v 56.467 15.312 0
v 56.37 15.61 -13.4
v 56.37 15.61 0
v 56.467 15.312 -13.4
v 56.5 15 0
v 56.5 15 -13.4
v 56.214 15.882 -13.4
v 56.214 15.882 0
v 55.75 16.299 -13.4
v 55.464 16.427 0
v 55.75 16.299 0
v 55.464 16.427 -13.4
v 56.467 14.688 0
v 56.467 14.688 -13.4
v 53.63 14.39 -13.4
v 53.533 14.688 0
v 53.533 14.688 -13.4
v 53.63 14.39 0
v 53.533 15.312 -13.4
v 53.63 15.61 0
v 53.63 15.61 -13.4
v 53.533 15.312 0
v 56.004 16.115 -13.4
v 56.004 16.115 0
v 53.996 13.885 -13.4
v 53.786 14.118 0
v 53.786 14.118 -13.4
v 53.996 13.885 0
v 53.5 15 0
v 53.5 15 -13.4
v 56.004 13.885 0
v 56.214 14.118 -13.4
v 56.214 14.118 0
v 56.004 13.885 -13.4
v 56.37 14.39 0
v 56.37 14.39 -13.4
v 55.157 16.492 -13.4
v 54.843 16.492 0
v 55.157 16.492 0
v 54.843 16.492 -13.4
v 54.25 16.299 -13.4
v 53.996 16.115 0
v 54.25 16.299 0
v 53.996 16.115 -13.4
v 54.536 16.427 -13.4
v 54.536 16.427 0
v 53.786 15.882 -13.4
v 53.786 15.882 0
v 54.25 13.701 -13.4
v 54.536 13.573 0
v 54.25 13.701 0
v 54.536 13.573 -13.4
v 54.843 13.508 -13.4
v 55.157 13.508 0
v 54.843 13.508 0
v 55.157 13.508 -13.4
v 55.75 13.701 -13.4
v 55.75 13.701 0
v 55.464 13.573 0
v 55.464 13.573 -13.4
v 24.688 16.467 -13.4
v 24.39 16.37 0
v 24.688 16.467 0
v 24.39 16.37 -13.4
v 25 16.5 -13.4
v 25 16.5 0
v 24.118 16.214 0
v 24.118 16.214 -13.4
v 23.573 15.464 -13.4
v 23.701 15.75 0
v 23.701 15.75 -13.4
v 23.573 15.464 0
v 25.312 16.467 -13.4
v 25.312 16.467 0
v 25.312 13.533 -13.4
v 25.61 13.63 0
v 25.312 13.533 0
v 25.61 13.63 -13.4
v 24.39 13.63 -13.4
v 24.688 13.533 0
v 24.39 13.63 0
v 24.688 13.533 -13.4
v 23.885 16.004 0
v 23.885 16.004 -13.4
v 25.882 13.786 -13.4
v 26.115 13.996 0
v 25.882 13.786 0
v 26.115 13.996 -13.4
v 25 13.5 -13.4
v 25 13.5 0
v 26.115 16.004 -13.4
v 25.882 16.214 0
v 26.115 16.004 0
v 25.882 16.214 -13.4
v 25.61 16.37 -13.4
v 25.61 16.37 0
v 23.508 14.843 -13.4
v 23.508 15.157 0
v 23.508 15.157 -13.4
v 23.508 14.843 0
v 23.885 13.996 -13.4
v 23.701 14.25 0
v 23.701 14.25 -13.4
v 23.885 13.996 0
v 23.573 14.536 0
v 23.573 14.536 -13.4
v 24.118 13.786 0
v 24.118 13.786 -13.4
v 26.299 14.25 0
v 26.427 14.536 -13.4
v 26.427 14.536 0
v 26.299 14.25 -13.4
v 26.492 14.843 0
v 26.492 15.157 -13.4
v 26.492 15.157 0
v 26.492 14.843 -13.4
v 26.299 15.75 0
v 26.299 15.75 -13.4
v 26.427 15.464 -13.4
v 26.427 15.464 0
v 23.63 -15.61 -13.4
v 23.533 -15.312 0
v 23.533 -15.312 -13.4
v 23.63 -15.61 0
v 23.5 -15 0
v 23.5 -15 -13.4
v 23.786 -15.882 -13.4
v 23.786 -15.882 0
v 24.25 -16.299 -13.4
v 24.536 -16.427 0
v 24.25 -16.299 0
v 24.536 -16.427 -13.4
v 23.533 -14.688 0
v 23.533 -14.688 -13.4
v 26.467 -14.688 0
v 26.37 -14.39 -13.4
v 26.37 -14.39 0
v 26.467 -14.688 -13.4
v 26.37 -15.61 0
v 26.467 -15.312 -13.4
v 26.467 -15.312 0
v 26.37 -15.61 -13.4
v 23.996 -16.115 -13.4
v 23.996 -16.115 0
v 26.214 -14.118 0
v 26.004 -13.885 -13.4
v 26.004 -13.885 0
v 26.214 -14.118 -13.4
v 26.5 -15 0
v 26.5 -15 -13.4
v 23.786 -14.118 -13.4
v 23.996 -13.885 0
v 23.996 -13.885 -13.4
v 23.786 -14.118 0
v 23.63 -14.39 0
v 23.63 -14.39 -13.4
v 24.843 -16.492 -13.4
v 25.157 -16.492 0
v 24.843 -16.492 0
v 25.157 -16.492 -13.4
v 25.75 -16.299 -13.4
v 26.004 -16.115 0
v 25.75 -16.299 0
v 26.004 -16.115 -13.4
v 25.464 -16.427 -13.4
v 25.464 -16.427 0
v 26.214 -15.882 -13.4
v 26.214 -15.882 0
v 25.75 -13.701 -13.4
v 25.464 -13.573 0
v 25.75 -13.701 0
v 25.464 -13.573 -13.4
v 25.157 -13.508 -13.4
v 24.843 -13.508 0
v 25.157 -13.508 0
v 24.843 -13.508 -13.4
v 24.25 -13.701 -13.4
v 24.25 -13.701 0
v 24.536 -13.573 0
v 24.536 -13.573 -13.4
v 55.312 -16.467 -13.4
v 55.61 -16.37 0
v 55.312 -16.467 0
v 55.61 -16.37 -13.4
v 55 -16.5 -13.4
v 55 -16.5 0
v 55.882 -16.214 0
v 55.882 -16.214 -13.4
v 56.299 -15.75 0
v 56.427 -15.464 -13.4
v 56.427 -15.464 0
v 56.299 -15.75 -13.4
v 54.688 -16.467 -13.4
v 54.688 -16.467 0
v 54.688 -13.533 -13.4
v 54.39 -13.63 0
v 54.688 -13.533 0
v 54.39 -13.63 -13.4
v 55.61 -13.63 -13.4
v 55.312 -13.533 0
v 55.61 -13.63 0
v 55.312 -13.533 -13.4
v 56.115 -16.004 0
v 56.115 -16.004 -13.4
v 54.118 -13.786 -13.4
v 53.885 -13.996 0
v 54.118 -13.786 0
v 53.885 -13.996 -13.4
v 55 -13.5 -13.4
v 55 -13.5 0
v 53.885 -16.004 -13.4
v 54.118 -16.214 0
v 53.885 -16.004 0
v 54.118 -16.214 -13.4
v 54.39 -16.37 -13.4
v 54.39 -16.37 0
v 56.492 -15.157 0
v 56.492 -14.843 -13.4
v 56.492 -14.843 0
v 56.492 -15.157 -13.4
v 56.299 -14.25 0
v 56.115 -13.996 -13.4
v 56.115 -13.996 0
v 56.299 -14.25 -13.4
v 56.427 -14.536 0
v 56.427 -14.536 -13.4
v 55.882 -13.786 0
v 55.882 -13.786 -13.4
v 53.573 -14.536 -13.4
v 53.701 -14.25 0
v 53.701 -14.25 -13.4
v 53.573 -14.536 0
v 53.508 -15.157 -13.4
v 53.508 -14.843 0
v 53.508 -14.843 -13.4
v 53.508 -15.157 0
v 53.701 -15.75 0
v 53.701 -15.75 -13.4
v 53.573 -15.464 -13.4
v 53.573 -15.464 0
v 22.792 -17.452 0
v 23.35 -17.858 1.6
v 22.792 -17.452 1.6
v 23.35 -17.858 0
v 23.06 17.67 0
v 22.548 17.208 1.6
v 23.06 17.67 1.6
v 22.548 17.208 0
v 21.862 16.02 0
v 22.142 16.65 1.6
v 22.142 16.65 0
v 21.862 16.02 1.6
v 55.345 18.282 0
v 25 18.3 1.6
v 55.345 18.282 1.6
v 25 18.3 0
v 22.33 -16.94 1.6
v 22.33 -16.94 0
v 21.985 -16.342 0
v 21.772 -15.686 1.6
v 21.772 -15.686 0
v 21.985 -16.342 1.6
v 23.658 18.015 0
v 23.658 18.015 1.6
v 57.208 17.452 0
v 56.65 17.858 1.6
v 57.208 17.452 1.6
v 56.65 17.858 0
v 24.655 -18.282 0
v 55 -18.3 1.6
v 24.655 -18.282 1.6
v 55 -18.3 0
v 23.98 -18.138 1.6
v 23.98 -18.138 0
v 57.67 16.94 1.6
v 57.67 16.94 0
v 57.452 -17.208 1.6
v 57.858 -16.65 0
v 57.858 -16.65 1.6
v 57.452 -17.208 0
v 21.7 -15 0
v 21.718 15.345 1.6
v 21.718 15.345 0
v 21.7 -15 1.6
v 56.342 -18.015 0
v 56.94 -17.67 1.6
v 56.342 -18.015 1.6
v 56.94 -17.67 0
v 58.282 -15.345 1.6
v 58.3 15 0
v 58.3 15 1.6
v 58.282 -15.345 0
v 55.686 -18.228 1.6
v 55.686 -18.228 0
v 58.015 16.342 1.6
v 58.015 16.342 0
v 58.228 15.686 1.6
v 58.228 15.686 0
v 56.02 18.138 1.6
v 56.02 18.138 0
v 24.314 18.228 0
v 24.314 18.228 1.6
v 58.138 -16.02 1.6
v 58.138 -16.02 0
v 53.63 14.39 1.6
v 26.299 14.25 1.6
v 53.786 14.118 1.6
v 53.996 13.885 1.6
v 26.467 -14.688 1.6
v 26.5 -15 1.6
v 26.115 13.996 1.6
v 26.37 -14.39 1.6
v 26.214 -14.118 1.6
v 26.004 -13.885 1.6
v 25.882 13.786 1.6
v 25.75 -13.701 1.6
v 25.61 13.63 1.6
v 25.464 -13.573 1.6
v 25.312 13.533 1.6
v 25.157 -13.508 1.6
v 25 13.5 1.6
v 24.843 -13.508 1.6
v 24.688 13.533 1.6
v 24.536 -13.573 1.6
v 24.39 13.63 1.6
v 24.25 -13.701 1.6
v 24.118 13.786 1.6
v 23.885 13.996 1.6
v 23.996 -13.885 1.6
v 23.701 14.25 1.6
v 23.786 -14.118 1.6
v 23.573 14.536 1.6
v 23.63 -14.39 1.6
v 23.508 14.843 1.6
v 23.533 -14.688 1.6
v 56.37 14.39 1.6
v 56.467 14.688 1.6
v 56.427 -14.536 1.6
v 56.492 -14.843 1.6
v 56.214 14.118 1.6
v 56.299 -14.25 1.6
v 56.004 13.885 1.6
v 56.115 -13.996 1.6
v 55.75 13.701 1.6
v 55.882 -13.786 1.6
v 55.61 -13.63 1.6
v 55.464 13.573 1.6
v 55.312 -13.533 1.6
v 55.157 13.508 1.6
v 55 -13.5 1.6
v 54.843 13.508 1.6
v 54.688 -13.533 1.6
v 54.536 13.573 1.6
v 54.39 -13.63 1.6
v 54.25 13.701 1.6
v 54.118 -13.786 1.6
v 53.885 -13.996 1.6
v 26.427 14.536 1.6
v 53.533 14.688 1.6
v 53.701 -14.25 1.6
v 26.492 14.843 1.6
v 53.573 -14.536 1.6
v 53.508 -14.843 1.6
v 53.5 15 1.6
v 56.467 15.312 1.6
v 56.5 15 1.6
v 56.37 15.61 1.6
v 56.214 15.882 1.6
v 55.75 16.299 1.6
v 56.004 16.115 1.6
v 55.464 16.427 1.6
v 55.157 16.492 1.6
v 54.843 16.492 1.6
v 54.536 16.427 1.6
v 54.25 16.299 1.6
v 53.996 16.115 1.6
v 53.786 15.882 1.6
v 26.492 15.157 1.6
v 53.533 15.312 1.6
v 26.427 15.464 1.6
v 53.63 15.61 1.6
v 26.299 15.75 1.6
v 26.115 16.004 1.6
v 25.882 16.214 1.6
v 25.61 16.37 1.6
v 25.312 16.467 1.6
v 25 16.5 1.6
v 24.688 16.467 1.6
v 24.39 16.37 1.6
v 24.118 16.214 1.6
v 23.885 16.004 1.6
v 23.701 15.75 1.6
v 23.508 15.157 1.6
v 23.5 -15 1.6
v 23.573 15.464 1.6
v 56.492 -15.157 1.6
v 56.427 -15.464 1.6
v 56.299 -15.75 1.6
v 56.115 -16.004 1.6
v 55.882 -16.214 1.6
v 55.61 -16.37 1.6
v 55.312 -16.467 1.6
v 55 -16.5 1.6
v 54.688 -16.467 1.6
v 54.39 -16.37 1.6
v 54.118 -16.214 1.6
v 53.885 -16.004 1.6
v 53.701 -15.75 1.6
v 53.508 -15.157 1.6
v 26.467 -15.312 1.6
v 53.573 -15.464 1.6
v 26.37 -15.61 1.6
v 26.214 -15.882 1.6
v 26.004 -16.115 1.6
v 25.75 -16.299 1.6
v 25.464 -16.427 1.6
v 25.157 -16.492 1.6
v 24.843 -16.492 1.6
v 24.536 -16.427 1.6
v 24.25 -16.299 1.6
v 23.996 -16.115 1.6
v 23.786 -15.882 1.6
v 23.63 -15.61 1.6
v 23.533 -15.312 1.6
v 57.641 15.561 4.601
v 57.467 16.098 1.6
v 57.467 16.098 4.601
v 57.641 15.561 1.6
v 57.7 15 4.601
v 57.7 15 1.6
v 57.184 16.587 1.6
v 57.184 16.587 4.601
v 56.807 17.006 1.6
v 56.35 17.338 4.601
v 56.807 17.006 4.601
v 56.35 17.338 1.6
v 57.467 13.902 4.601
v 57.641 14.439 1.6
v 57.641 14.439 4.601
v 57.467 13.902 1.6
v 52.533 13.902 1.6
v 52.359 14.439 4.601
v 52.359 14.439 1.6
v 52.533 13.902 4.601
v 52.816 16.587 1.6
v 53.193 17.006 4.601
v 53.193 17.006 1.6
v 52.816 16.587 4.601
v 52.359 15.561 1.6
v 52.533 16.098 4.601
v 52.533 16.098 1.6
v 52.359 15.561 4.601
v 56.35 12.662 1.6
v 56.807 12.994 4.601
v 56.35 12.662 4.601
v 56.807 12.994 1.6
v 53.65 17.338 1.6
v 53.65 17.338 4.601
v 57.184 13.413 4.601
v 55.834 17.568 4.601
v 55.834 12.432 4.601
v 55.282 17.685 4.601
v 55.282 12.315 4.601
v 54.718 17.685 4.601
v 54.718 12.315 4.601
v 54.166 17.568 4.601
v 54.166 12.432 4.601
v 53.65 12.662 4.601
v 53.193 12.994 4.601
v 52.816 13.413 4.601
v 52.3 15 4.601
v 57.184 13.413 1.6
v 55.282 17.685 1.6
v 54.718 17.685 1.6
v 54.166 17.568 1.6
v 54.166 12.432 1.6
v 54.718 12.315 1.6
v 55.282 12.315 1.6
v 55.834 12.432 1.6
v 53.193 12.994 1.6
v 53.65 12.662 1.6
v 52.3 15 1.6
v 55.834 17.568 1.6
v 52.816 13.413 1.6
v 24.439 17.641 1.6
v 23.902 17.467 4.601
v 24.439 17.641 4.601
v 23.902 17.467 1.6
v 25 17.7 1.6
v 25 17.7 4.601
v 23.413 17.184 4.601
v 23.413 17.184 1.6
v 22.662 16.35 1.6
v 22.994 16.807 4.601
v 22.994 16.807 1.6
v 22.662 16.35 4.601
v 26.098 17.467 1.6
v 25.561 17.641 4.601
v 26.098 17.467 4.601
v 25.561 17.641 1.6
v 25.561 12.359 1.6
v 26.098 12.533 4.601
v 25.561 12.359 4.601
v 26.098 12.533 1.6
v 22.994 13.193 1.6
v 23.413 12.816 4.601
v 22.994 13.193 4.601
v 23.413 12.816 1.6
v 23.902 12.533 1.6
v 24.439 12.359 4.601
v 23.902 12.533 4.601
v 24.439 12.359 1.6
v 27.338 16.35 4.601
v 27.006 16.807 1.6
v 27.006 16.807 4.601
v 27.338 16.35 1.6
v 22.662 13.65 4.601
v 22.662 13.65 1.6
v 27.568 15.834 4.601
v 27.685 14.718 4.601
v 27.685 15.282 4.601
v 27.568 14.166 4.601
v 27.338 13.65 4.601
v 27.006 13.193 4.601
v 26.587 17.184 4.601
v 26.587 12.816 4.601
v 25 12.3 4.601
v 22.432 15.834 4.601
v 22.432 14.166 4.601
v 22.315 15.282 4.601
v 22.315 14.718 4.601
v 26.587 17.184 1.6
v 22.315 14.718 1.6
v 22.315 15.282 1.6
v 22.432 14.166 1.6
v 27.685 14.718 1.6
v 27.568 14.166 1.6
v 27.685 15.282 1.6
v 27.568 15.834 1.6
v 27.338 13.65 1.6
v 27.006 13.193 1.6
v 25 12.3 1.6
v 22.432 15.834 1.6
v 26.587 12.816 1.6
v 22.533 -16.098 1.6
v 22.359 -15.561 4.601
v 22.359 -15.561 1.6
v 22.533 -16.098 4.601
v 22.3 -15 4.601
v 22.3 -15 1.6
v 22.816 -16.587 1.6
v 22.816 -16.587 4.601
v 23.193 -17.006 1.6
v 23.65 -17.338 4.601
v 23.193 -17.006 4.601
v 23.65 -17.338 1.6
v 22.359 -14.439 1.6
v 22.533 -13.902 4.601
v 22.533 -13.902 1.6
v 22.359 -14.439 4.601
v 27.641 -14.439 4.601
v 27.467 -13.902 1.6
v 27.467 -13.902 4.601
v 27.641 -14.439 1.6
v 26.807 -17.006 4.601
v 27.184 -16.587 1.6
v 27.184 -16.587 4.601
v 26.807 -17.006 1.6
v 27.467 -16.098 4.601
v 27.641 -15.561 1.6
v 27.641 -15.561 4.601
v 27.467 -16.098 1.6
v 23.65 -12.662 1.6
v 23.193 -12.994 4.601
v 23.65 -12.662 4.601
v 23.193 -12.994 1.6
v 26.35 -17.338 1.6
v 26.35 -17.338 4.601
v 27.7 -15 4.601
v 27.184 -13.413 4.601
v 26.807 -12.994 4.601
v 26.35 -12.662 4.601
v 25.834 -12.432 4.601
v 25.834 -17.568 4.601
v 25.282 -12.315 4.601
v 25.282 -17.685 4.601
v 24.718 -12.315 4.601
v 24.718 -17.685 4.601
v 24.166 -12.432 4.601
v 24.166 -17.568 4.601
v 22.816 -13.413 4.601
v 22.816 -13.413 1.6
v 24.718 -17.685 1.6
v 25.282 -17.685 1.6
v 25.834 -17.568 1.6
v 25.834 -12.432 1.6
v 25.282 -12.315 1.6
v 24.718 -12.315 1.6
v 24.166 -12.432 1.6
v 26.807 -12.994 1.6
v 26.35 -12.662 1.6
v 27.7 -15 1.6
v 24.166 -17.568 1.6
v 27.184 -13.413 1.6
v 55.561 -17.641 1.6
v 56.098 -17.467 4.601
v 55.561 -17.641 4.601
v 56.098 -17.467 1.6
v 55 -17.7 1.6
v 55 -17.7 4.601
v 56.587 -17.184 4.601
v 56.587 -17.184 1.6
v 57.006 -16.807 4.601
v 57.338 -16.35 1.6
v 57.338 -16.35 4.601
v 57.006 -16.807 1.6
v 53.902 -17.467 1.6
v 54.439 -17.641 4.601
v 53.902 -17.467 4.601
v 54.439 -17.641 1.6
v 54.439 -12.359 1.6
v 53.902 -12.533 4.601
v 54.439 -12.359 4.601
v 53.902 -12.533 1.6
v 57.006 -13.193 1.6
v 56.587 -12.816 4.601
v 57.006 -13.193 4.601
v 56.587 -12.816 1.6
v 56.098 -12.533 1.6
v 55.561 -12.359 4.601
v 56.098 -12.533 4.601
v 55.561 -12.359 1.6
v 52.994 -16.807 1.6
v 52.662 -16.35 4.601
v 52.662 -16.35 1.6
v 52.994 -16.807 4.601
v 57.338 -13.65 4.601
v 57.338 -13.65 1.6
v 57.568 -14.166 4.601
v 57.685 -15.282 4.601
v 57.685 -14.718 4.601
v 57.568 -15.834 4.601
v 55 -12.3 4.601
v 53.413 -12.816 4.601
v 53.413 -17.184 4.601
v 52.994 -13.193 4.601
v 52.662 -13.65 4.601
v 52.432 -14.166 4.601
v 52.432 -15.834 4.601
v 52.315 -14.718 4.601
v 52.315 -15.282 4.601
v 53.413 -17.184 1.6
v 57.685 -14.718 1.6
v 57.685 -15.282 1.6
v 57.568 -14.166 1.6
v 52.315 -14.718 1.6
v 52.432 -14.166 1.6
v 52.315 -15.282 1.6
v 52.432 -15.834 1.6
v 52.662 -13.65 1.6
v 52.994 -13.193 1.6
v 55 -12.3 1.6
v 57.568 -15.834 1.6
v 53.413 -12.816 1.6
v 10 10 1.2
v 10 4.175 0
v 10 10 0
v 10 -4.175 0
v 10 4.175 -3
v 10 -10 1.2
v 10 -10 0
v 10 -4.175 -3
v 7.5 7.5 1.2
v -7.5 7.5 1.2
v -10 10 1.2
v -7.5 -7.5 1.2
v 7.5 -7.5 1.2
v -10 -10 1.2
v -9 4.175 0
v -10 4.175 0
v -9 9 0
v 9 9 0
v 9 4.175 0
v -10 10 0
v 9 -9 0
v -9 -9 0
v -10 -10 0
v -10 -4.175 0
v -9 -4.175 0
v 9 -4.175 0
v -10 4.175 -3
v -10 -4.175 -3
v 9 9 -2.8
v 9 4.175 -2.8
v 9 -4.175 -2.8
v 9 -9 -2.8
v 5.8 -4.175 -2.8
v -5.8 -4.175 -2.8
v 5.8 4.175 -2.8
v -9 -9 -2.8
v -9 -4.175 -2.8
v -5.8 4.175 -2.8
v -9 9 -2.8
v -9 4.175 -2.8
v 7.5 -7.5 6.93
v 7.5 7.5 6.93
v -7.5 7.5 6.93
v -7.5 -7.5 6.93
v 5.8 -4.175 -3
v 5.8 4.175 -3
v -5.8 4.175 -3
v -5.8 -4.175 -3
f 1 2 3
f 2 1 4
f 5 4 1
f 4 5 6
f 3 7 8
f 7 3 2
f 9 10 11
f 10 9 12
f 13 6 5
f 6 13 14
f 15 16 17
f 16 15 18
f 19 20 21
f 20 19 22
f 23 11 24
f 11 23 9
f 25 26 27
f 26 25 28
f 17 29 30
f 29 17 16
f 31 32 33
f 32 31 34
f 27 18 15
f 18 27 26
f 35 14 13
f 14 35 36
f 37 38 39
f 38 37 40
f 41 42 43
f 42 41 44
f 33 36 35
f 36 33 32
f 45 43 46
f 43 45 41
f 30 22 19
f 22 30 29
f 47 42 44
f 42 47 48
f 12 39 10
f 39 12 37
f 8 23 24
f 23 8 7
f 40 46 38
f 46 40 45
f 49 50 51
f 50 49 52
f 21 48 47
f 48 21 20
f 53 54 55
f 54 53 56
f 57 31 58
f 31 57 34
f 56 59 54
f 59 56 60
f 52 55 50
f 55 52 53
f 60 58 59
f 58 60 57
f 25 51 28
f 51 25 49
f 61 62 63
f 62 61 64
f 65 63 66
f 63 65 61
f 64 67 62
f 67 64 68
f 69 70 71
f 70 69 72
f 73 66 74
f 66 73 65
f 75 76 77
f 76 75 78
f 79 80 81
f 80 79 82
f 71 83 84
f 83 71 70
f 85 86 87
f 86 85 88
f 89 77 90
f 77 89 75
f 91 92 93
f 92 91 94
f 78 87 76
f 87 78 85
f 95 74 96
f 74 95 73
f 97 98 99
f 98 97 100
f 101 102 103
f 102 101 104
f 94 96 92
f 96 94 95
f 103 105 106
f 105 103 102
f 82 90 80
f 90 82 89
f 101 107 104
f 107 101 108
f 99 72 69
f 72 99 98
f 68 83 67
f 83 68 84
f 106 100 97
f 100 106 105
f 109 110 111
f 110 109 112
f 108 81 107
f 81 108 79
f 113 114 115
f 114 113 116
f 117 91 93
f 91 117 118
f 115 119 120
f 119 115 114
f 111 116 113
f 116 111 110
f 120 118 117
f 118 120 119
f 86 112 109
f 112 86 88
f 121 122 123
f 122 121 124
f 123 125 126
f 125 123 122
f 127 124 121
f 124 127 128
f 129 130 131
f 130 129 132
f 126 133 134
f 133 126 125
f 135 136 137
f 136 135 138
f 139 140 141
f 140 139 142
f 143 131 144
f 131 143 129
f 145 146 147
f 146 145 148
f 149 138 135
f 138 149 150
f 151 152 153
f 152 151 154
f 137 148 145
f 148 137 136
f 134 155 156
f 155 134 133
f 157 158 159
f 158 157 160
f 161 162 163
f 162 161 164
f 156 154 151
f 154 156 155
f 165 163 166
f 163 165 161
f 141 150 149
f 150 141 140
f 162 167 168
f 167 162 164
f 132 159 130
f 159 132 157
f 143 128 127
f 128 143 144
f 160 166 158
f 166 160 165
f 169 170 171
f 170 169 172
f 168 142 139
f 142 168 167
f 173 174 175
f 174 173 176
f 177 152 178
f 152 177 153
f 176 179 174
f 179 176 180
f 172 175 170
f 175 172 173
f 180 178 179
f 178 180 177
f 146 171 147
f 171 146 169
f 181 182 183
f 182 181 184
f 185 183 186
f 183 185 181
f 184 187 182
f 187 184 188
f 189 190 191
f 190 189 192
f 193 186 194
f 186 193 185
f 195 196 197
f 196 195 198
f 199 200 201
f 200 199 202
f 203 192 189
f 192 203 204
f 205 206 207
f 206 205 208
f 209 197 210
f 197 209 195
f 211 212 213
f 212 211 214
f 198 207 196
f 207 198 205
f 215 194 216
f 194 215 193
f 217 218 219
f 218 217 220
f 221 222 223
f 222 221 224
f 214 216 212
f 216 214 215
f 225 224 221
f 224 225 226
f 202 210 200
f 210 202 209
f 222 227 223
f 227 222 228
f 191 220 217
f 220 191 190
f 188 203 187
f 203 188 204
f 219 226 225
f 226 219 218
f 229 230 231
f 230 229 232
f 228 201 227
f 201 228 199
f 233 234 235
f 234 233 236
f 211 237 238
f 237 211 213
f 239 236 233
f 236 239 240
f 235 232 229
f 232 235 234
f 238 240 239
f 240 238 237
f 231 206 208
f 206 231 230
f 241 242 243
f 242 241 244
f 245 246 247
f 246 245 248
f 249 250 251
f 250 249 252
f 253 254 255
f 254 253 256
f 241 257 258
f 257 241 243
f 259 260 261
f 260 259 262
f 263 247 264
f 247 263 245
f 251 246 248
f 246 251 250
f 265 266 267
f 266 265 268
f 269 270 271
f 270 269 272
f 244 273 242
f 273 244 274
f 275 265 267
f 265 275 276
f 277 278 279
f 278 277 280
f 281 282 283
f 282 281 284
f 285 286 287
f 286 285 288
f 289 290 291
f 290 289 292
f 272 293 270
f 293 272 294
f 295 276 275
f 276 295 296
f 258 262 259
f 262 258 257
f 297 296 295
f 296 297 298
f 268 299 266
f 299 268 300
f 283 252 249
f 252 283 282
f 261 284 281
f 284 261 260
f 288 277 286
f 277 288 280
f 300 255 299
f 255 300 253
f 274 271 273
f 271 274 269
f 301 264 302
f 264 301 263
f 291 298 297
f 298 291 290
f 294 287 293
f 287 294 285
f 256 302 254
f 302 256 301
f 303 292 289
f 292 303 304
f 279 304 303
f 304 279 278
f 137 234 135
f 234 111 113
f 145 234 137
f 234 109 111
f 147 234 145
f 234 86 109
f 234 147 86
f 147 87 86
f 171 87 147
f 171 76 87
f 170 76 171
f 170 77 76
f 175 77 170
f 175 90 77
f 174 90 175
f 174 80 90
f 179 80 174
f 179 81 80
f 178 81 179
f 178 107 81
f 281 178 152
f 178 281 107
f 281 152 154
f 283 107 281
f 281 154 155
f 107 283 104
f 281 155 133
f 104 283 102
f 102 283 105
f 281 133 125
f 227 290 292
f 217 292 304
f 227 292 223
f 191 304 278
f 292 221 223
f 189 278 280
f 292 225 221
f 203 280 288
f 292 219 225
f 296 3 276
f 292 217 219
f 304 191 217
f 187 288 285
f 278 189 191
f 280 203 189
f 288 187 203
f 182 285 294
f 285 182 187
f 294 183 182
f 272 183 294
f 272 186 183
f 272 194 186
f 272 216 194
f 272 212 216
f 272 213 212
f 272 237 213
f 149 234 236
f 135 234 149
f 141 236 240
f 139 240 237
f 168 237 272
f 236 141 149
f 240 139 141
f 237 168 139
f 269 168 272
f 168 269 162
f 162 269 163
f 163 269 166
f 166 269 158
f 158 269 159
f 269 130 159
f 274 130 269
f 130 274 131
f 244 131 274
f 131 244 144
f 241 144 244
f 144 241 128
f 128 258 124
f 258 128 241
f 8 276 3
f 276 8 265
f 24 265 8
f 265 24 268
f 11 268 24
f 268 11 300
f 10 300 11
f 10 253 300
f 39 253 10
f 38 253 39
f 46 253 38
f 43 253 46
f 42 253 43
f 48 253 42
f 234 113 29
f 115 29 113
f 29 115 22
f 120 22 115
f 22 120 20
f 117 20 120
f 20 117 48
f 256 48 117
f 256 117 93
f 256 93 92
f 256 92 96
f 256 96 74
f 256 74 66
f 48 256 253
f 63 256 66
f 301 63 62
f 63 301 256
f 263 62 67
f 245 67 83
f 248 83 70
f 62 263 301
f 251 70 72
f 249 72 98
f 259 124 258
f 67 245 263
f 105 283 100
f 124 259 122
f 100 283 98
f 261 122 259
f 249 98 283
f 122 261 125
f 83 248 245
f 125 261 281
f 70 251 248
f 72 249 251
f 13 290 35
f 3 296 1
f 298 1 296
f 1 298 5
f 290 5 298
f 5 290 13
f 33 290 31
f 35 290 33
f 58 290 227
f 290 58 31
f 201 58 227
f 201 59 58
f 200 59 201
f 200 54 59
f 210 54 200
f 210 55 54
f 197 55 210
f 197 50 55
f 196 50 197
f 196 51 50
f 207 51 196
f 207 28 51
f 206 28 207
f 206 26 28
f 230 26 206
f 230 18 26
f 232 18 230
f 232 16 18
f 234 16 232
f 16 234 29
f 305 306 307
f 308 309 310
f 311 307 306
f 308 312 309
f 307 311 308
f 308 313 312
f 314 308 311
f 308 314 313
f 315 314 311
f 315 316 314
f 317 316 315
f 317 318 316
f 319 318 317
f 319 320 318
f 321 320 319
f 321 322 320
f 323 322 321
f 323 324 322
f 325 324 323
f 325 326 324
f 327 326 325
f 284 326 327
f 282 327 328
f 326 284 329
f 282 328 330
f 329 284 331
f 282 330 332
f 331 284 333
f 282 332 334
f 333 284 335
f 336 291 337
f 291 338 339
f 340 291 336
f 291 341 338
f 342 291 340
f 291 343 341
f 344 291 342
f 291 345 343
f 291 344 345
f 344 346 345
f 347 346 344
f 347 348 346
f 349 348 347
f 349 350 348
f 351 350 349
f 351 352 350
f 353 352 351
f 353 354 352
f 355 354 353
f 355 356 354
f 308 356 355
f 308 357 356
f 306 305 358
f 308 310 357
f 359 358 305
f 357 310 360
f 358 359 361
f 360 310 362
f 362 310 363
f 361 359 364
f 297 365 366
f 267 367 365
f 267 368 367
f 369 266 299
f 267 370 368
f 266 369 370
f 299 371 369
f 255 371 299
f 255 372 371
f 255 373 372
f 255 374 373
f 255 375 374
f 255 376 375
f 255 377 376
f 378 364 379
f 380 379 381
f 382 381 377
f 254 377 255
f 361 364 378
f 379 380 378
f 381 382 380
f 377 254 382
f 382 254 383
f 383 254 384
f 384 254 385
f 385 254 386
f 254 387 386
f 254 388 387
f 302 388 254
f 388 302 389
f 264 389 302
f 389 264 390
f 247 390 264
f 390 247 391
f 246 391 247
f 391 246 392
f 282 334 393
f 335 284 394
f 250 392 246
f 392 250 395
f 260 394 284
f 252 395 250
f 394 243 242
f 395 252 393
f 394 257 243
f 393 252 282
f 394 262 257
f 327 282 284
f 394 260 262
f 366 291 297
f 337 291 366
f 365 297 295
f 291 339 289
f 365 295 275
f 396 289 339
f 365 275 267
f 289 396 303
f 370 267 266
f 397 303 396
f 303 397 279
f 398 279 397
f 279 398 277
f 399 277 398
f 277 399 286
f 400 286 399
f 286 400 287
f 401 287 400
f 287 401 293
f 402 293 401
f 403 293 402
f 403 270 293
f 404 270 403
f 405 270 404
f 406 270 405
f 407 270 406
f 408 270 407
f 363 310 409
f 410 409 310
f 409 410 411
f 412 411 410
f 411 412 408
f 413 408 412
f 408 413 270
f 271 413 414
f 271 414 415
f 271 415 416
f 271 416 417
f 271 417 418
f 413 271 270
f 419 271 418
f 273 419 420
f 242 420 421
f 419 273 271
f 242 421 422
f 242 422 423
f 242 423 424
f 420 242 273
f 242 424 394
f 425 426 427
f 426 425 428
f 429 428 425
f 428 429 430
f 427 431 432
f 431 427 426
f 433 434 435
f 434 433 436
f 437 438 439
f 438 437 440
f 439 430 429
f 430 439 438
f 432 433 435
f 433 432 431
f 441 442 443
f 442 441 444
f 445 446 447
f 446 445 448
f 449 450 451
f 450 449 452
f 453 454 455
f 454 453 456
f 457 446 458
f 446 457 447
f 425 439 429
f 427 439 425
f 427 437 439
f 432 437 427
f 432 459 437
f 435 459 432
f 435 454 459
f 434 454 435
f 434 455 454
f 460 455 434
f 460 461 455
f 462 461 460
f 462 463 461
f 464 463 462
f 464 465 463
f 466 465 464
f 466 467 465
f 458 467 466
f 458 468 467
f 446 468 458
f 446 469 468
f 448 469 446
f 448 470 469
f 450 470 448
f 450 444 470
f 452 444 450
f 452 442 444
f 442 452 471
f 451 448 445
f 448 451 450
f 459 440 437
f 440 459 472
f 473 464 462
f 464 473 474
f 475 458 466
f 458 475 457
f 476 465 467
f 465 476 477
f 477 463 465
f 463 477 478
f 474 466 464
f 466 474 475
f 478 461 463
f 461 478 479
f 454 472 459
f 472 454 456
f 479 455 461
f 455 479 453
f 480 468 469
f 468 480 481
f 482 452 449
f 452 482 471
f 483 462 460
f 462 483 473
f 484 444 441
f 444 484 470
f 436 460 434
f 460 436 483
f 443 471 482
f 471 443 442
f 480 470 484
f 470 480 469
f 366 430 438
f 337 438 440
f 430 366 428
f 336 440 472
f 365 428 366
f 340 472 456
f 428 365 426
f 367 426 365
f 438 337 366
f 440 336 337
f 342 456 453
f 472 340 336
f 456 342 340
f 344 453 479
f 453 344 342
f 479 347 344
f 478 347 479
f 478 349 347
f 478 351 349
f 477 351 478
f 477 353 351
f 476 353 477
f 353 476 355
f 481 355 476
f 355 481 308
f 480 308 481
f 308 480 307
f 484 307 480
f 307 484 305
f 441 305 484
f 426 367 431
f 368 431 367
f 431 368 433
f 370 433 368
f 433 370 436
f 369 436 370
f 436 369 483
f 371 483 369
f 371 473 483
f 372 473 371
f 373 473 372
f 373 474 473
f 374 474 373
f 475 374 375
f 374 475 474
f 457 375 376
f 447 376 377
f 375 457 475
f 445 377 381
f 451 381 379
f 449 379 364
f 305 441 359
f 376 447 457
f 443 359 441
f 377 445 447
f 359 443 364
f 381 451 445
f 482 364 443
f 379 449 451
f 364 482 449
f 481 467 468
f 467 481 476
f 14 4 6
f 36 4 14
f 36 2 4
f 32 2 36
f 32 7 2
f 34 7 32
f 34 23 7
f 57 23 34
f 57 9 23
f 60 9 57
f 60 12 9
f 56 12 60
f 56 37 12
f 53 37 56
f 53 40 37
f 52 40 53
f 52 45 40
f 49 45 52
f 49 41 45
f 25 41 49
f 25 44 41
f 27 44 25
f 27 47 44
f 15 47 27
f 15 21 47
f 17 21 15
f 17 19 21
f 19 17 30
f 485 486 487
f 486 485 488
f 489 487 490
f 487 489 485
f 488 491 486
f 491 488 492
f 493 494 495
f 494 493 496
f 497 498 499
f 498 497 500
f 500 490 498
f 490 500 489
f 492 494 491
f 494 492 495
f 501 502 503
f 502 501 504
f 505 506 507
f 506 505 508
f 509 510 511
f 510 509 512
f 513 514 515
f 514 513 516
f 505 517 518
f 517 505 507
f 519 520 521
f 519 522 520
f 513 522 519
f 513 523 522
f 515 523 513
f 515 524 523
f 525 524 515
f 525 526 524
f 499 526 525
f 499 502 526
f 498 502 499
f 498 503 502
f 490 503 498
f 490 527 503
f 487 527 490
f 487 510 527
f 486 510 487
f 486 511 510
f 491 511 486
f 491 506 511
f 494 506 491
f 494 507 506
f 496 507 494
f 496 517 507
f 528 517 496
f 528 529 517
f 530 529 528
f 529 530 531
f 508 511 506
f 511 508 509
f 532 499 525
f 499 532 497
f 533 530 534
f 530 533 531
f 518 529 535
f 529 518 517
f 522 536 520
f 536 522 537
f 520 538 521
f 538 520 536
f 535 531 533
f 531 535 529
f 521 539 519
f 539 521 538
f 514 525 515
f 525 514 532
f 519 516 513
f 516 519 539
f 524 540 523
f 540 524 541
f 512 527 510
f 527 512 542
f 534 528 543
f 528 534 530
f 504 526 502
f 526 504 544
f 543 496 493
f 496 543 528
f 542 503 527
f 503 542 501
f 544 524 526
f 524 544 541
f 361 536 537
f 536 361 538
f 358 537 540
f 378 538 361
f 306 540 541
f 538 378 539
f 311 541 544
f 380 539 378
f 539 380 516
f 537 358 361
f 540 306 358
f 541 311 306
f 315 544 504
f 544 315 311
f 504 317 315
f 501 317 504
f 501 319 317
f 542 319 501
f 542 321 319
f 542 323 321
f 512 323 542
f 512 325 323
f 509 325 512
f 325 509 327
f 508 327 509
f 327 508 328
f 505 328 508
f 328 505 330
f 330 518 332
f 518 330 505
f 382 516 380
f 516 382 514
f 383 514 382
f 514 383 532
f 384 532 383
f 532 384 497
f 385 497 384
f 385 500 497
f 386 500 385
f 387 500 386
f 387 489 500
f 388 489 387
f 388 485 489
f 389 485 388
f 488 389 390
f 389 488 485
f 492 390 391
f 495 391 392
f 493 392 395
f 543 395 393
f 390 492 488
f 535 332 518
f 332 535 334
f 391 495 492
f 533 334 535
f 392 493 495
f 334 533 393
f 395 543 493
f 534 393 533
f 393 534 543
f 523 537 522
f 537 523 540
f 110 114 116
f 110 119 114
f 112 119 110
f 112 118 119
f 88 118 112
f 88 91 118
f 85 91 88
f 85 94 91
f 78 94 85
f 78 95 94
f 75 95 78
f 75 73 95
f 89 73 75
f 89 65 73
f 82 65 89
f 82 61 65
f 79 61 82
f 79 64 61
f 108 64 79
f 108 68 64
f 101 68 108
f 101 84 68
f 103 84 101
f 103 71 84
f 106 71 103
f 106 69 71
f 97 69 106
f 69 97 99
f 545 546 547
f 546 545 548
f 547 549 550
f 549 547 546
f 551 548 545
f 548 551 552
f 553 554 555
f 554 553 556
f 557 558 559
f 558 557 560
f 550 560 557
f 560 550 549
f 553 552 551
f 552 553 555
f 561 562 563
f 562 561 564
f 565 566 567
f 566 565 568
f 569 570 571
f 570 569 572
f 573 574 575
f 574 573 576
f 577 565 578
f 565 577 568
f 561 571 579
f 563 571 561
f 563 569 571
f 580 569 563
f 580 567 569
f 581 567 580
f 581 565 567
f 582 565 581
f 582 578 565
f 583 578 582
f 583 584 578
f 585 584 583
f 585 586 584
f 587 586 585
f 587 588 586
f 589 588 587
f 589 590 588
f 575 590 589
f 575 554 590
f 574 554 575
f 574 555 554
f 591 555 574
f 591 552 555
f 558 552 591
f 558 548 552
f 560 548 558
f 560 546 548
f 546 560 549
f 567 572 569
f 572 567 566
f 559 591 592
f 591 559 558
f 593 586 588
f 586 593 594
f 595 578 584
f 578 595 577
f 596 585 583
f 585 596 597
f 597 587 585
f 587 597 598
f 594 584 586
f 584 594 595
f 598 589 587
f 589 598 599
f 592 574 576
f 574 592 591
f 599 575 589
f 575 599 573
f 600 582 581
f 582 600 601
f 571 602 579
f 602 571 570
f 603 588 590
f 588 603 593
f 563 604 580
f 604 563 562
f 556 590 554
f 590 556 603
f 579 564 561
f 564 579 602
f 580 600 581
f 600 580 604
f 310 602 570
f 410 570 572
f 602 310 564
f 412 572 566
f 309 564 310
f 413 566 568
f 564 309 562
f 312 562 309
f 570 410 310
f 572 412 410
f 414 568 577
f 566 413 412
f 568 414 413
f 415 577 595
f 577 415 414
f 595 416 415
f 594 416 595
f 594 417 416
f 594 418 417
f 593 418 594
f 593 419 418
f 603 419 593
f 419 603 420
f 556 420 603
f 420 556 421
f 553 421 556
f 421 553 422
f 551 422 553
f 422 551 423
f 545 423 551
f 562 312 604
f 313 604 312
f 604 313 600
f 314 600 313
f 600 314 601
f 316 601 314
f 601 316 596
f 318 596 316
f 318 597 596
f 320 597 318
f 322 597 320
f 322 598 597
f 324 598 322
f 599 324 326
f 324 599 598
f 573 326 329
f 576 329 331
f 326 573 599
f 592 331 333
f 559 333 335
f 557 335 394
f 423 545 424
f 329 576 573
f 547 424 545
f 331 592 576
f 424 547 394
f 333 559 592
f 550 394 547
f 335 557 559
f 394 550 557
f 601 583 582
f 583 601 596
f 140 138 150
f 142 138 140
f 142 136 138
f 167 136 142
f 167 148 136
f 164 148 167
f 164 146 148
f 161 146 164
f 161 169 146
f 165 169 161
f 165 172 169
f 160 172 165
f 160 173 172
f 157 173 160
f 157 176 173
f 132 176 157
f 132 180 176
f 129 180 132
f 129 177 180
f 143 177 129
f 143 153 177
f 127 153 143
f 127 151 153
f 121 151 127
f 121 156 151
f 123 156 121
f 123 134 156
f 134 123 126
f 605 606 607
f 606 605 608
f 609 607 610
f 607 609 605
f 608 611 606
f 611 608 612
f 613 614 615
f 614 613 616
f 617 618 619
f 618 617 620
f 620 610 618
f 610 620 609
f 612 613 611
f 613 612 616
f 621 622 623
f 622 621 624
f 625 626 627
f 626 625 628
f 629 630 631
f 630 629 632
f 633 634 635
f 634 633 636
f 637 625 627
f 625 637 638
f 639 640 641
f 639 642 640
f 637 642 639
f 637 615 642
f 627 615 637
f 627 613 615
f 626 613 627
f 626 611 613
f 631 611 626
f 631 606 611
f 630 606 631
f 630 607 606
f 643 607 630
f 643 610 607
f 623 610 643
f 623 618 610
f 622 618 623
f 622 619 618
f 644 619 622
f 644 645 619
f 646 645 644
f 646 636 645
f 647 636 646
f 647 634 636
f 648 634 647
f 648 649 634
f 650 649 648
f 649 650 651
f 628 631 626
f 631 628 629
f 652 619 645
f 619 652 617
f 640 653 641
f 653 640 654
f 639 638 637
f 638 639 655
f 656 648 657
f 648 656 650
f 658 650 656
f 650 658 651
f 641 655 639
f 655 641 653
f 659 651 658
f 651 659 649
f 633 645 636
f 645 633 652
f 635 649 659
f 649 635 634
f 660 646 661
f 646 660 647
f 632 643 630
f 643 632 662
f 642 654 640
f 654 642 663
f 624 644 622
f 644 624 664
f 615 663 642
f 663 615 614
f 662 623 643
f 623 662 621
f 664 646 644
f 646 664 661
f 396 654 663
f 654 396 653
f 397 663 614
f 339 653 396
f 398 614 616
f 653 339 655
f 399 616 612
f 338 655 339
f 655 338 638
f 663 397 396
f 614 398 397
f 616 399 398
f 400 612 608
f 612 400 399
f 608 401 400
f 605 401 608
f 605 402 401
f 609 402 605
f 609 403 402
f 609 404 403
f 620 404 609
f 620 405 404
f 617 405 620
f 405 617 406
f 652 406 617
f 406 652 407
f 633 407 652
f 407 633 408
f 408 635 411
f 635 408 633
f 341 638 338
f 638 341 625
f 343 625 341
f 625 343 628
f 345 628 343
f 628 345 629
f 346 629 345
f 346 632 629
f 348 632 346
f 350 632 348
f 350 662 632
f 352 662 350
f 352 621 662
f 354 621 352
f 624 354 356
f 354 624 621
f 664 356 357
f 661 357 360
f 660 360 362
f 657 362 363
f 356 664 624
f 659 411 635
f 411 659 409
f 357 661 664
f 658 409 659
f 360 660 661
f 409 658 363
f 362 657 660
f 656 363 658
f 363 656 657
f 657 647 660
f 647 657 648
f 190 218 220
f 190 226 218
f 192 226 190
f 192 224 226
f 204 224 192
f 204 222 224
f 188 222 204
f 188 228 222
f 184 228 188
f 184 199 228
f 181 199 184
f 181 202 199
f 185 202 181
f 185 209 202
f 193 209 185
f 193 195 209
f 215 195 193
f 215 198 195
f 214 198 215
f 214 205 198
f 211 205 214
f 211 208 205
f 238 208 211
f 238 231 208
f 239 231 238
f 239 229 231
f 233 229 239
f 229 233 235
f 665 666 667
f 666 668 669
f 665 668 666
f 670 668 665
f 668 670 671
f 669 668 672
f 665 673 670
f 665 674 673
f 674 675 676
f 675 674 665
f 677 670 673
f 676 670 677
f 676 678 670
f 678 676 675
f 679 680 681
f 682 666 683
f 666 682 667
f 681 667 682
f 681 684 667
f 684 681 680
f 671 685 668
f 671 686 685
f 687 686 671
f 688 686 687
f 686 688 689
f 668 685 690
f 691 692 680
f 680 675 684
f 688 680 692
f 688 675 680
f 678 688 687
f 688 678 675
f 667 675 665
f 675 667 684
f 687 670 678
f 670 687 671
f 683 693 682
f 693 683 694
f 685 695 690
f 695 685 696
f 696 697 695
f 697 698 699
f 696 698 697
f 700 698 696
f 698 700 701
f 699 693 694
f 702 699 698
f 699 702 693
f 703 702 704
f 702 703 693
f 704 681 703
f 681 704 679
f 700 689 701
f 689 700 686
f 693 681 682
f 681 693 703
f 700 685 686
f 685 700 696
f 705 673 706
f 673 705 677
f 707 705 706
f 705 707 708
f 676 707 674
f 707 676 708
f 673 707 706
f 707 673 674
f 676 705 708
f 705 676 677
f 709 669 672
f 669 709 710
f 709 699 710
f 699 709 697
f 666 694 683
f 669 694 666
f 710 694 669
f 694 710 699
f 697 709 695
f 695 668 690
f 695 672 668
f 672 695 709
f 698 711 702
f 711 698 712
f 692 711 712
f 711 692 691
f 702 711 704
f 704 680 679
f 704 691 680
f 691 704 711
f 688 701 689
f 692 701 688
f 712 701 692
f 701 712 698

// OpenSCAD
// file: core.scad
SMALL_NUMBER = 0.001;

module HexScrew(length, m = 3) {
    color("grey") {
        cylinder(m+0.001, m*.9, m*.9, center = false);
        translate([0, 0, -length]) cylinder(length+.01, d1 = m, d2 = m, center = false);
    }
}

module HexScrewHeadClearance(m = 3) {
    cylinder(m * 2, m*2, 1, center = false);
}

module HexScrewConnection(m = 3, length = 20, cut = 10.001) {
    cylinder(cut, m*.9, m+(cut/5), center = false);
    HexScrew(length, m);
}

module SquareOf(size, rotate = 0) {
    offset = size / 2;

    rotate(rotate) translate([offset, offset]) rotate(-rotate) children(0);
    rotate(90 + rotate) translate([offset, offset]) rotate(-rotate) children(0);
    rotate(180 + rotate) translate([offset, offset]) rotate(-rotate) children(0);
    rotate(270 + rotate) translate([offset, offset]) rotate(-rotate) children(0);
}

module PaddedCube(size = [1, 1, 1], pad = 0, center = false) {
    new_size = [size[0] + pad, size[1] + pad, size[2] + pad];
    if (center)
        cube(new_size, center = true);
    else
        translate([-pad/2, -pad/2, -pad/2])
            cube(new_size, center = false);
}

HexScrew(50, m = 10);

translate([30, 0, 0]) {
    color("red") HexScrew(20, m = 3);
    color("blue") HexScrewHeadClearance(3);
}
// main file
$fs = 0.01;

use <core.scad>

module FlightController(color = "blue", spacing = 30, diameter = 3, thickness = 1.6) {
    pad = 1.8;

    pad_radius = diameter / 2 + pad;

    color(color)
    difference() {
		hull() SquareOf(spacing) cylinder(thickness, pad_radius, pad_radius, center = false);

        translate([0, 0, thickness]) FlightControllerMounts(10, spacing, diameter);
    }
}

module FlightControllerMounts(length, spacing = 30, diameter = 3) {
    SquareOf(spacing) HexScrew(length, diameter);
}

module TMotorF7Pro() {
	board_thickness = 1.6;
	FlightController(spacing = 30, diameter = 4, thickness = board_thickness);
	
	size = 37.3;
	usb_width = 9;
	usb_offset = 19 - usb_width;

	translate([-(size/2) + usb_offset, (size/2) - 7.4, board_thickness])
	cube([9, 7.4, 3.4]);
}

module GPS() {
	color("blue")
	translate([0, 0, 1.2/2])
	cube([20, 20, 1.2], center = true);

	color("blue")
	translate([0, 0, -2.8/2])
	cube([18, 18, 2.8], center = true);

	color("orange")
	translate([0, 0, (1.2 + 6.33) / 2])
	cube([15, 15, 6.33], center = true);

	color("white")
	translate([10 - 4.2, -8.35/2, -3])
	cube([4.2, 8.35, 3]);

	color("white")
	translate([-10, -8.35/2, -3])
	cube([4.2, 8.35, 3]);
}

translate([40, 0, 0]) {
	FlightController();
	translate([0,0,1.6]) FlightControllerMounts(15);
}

GPS();
